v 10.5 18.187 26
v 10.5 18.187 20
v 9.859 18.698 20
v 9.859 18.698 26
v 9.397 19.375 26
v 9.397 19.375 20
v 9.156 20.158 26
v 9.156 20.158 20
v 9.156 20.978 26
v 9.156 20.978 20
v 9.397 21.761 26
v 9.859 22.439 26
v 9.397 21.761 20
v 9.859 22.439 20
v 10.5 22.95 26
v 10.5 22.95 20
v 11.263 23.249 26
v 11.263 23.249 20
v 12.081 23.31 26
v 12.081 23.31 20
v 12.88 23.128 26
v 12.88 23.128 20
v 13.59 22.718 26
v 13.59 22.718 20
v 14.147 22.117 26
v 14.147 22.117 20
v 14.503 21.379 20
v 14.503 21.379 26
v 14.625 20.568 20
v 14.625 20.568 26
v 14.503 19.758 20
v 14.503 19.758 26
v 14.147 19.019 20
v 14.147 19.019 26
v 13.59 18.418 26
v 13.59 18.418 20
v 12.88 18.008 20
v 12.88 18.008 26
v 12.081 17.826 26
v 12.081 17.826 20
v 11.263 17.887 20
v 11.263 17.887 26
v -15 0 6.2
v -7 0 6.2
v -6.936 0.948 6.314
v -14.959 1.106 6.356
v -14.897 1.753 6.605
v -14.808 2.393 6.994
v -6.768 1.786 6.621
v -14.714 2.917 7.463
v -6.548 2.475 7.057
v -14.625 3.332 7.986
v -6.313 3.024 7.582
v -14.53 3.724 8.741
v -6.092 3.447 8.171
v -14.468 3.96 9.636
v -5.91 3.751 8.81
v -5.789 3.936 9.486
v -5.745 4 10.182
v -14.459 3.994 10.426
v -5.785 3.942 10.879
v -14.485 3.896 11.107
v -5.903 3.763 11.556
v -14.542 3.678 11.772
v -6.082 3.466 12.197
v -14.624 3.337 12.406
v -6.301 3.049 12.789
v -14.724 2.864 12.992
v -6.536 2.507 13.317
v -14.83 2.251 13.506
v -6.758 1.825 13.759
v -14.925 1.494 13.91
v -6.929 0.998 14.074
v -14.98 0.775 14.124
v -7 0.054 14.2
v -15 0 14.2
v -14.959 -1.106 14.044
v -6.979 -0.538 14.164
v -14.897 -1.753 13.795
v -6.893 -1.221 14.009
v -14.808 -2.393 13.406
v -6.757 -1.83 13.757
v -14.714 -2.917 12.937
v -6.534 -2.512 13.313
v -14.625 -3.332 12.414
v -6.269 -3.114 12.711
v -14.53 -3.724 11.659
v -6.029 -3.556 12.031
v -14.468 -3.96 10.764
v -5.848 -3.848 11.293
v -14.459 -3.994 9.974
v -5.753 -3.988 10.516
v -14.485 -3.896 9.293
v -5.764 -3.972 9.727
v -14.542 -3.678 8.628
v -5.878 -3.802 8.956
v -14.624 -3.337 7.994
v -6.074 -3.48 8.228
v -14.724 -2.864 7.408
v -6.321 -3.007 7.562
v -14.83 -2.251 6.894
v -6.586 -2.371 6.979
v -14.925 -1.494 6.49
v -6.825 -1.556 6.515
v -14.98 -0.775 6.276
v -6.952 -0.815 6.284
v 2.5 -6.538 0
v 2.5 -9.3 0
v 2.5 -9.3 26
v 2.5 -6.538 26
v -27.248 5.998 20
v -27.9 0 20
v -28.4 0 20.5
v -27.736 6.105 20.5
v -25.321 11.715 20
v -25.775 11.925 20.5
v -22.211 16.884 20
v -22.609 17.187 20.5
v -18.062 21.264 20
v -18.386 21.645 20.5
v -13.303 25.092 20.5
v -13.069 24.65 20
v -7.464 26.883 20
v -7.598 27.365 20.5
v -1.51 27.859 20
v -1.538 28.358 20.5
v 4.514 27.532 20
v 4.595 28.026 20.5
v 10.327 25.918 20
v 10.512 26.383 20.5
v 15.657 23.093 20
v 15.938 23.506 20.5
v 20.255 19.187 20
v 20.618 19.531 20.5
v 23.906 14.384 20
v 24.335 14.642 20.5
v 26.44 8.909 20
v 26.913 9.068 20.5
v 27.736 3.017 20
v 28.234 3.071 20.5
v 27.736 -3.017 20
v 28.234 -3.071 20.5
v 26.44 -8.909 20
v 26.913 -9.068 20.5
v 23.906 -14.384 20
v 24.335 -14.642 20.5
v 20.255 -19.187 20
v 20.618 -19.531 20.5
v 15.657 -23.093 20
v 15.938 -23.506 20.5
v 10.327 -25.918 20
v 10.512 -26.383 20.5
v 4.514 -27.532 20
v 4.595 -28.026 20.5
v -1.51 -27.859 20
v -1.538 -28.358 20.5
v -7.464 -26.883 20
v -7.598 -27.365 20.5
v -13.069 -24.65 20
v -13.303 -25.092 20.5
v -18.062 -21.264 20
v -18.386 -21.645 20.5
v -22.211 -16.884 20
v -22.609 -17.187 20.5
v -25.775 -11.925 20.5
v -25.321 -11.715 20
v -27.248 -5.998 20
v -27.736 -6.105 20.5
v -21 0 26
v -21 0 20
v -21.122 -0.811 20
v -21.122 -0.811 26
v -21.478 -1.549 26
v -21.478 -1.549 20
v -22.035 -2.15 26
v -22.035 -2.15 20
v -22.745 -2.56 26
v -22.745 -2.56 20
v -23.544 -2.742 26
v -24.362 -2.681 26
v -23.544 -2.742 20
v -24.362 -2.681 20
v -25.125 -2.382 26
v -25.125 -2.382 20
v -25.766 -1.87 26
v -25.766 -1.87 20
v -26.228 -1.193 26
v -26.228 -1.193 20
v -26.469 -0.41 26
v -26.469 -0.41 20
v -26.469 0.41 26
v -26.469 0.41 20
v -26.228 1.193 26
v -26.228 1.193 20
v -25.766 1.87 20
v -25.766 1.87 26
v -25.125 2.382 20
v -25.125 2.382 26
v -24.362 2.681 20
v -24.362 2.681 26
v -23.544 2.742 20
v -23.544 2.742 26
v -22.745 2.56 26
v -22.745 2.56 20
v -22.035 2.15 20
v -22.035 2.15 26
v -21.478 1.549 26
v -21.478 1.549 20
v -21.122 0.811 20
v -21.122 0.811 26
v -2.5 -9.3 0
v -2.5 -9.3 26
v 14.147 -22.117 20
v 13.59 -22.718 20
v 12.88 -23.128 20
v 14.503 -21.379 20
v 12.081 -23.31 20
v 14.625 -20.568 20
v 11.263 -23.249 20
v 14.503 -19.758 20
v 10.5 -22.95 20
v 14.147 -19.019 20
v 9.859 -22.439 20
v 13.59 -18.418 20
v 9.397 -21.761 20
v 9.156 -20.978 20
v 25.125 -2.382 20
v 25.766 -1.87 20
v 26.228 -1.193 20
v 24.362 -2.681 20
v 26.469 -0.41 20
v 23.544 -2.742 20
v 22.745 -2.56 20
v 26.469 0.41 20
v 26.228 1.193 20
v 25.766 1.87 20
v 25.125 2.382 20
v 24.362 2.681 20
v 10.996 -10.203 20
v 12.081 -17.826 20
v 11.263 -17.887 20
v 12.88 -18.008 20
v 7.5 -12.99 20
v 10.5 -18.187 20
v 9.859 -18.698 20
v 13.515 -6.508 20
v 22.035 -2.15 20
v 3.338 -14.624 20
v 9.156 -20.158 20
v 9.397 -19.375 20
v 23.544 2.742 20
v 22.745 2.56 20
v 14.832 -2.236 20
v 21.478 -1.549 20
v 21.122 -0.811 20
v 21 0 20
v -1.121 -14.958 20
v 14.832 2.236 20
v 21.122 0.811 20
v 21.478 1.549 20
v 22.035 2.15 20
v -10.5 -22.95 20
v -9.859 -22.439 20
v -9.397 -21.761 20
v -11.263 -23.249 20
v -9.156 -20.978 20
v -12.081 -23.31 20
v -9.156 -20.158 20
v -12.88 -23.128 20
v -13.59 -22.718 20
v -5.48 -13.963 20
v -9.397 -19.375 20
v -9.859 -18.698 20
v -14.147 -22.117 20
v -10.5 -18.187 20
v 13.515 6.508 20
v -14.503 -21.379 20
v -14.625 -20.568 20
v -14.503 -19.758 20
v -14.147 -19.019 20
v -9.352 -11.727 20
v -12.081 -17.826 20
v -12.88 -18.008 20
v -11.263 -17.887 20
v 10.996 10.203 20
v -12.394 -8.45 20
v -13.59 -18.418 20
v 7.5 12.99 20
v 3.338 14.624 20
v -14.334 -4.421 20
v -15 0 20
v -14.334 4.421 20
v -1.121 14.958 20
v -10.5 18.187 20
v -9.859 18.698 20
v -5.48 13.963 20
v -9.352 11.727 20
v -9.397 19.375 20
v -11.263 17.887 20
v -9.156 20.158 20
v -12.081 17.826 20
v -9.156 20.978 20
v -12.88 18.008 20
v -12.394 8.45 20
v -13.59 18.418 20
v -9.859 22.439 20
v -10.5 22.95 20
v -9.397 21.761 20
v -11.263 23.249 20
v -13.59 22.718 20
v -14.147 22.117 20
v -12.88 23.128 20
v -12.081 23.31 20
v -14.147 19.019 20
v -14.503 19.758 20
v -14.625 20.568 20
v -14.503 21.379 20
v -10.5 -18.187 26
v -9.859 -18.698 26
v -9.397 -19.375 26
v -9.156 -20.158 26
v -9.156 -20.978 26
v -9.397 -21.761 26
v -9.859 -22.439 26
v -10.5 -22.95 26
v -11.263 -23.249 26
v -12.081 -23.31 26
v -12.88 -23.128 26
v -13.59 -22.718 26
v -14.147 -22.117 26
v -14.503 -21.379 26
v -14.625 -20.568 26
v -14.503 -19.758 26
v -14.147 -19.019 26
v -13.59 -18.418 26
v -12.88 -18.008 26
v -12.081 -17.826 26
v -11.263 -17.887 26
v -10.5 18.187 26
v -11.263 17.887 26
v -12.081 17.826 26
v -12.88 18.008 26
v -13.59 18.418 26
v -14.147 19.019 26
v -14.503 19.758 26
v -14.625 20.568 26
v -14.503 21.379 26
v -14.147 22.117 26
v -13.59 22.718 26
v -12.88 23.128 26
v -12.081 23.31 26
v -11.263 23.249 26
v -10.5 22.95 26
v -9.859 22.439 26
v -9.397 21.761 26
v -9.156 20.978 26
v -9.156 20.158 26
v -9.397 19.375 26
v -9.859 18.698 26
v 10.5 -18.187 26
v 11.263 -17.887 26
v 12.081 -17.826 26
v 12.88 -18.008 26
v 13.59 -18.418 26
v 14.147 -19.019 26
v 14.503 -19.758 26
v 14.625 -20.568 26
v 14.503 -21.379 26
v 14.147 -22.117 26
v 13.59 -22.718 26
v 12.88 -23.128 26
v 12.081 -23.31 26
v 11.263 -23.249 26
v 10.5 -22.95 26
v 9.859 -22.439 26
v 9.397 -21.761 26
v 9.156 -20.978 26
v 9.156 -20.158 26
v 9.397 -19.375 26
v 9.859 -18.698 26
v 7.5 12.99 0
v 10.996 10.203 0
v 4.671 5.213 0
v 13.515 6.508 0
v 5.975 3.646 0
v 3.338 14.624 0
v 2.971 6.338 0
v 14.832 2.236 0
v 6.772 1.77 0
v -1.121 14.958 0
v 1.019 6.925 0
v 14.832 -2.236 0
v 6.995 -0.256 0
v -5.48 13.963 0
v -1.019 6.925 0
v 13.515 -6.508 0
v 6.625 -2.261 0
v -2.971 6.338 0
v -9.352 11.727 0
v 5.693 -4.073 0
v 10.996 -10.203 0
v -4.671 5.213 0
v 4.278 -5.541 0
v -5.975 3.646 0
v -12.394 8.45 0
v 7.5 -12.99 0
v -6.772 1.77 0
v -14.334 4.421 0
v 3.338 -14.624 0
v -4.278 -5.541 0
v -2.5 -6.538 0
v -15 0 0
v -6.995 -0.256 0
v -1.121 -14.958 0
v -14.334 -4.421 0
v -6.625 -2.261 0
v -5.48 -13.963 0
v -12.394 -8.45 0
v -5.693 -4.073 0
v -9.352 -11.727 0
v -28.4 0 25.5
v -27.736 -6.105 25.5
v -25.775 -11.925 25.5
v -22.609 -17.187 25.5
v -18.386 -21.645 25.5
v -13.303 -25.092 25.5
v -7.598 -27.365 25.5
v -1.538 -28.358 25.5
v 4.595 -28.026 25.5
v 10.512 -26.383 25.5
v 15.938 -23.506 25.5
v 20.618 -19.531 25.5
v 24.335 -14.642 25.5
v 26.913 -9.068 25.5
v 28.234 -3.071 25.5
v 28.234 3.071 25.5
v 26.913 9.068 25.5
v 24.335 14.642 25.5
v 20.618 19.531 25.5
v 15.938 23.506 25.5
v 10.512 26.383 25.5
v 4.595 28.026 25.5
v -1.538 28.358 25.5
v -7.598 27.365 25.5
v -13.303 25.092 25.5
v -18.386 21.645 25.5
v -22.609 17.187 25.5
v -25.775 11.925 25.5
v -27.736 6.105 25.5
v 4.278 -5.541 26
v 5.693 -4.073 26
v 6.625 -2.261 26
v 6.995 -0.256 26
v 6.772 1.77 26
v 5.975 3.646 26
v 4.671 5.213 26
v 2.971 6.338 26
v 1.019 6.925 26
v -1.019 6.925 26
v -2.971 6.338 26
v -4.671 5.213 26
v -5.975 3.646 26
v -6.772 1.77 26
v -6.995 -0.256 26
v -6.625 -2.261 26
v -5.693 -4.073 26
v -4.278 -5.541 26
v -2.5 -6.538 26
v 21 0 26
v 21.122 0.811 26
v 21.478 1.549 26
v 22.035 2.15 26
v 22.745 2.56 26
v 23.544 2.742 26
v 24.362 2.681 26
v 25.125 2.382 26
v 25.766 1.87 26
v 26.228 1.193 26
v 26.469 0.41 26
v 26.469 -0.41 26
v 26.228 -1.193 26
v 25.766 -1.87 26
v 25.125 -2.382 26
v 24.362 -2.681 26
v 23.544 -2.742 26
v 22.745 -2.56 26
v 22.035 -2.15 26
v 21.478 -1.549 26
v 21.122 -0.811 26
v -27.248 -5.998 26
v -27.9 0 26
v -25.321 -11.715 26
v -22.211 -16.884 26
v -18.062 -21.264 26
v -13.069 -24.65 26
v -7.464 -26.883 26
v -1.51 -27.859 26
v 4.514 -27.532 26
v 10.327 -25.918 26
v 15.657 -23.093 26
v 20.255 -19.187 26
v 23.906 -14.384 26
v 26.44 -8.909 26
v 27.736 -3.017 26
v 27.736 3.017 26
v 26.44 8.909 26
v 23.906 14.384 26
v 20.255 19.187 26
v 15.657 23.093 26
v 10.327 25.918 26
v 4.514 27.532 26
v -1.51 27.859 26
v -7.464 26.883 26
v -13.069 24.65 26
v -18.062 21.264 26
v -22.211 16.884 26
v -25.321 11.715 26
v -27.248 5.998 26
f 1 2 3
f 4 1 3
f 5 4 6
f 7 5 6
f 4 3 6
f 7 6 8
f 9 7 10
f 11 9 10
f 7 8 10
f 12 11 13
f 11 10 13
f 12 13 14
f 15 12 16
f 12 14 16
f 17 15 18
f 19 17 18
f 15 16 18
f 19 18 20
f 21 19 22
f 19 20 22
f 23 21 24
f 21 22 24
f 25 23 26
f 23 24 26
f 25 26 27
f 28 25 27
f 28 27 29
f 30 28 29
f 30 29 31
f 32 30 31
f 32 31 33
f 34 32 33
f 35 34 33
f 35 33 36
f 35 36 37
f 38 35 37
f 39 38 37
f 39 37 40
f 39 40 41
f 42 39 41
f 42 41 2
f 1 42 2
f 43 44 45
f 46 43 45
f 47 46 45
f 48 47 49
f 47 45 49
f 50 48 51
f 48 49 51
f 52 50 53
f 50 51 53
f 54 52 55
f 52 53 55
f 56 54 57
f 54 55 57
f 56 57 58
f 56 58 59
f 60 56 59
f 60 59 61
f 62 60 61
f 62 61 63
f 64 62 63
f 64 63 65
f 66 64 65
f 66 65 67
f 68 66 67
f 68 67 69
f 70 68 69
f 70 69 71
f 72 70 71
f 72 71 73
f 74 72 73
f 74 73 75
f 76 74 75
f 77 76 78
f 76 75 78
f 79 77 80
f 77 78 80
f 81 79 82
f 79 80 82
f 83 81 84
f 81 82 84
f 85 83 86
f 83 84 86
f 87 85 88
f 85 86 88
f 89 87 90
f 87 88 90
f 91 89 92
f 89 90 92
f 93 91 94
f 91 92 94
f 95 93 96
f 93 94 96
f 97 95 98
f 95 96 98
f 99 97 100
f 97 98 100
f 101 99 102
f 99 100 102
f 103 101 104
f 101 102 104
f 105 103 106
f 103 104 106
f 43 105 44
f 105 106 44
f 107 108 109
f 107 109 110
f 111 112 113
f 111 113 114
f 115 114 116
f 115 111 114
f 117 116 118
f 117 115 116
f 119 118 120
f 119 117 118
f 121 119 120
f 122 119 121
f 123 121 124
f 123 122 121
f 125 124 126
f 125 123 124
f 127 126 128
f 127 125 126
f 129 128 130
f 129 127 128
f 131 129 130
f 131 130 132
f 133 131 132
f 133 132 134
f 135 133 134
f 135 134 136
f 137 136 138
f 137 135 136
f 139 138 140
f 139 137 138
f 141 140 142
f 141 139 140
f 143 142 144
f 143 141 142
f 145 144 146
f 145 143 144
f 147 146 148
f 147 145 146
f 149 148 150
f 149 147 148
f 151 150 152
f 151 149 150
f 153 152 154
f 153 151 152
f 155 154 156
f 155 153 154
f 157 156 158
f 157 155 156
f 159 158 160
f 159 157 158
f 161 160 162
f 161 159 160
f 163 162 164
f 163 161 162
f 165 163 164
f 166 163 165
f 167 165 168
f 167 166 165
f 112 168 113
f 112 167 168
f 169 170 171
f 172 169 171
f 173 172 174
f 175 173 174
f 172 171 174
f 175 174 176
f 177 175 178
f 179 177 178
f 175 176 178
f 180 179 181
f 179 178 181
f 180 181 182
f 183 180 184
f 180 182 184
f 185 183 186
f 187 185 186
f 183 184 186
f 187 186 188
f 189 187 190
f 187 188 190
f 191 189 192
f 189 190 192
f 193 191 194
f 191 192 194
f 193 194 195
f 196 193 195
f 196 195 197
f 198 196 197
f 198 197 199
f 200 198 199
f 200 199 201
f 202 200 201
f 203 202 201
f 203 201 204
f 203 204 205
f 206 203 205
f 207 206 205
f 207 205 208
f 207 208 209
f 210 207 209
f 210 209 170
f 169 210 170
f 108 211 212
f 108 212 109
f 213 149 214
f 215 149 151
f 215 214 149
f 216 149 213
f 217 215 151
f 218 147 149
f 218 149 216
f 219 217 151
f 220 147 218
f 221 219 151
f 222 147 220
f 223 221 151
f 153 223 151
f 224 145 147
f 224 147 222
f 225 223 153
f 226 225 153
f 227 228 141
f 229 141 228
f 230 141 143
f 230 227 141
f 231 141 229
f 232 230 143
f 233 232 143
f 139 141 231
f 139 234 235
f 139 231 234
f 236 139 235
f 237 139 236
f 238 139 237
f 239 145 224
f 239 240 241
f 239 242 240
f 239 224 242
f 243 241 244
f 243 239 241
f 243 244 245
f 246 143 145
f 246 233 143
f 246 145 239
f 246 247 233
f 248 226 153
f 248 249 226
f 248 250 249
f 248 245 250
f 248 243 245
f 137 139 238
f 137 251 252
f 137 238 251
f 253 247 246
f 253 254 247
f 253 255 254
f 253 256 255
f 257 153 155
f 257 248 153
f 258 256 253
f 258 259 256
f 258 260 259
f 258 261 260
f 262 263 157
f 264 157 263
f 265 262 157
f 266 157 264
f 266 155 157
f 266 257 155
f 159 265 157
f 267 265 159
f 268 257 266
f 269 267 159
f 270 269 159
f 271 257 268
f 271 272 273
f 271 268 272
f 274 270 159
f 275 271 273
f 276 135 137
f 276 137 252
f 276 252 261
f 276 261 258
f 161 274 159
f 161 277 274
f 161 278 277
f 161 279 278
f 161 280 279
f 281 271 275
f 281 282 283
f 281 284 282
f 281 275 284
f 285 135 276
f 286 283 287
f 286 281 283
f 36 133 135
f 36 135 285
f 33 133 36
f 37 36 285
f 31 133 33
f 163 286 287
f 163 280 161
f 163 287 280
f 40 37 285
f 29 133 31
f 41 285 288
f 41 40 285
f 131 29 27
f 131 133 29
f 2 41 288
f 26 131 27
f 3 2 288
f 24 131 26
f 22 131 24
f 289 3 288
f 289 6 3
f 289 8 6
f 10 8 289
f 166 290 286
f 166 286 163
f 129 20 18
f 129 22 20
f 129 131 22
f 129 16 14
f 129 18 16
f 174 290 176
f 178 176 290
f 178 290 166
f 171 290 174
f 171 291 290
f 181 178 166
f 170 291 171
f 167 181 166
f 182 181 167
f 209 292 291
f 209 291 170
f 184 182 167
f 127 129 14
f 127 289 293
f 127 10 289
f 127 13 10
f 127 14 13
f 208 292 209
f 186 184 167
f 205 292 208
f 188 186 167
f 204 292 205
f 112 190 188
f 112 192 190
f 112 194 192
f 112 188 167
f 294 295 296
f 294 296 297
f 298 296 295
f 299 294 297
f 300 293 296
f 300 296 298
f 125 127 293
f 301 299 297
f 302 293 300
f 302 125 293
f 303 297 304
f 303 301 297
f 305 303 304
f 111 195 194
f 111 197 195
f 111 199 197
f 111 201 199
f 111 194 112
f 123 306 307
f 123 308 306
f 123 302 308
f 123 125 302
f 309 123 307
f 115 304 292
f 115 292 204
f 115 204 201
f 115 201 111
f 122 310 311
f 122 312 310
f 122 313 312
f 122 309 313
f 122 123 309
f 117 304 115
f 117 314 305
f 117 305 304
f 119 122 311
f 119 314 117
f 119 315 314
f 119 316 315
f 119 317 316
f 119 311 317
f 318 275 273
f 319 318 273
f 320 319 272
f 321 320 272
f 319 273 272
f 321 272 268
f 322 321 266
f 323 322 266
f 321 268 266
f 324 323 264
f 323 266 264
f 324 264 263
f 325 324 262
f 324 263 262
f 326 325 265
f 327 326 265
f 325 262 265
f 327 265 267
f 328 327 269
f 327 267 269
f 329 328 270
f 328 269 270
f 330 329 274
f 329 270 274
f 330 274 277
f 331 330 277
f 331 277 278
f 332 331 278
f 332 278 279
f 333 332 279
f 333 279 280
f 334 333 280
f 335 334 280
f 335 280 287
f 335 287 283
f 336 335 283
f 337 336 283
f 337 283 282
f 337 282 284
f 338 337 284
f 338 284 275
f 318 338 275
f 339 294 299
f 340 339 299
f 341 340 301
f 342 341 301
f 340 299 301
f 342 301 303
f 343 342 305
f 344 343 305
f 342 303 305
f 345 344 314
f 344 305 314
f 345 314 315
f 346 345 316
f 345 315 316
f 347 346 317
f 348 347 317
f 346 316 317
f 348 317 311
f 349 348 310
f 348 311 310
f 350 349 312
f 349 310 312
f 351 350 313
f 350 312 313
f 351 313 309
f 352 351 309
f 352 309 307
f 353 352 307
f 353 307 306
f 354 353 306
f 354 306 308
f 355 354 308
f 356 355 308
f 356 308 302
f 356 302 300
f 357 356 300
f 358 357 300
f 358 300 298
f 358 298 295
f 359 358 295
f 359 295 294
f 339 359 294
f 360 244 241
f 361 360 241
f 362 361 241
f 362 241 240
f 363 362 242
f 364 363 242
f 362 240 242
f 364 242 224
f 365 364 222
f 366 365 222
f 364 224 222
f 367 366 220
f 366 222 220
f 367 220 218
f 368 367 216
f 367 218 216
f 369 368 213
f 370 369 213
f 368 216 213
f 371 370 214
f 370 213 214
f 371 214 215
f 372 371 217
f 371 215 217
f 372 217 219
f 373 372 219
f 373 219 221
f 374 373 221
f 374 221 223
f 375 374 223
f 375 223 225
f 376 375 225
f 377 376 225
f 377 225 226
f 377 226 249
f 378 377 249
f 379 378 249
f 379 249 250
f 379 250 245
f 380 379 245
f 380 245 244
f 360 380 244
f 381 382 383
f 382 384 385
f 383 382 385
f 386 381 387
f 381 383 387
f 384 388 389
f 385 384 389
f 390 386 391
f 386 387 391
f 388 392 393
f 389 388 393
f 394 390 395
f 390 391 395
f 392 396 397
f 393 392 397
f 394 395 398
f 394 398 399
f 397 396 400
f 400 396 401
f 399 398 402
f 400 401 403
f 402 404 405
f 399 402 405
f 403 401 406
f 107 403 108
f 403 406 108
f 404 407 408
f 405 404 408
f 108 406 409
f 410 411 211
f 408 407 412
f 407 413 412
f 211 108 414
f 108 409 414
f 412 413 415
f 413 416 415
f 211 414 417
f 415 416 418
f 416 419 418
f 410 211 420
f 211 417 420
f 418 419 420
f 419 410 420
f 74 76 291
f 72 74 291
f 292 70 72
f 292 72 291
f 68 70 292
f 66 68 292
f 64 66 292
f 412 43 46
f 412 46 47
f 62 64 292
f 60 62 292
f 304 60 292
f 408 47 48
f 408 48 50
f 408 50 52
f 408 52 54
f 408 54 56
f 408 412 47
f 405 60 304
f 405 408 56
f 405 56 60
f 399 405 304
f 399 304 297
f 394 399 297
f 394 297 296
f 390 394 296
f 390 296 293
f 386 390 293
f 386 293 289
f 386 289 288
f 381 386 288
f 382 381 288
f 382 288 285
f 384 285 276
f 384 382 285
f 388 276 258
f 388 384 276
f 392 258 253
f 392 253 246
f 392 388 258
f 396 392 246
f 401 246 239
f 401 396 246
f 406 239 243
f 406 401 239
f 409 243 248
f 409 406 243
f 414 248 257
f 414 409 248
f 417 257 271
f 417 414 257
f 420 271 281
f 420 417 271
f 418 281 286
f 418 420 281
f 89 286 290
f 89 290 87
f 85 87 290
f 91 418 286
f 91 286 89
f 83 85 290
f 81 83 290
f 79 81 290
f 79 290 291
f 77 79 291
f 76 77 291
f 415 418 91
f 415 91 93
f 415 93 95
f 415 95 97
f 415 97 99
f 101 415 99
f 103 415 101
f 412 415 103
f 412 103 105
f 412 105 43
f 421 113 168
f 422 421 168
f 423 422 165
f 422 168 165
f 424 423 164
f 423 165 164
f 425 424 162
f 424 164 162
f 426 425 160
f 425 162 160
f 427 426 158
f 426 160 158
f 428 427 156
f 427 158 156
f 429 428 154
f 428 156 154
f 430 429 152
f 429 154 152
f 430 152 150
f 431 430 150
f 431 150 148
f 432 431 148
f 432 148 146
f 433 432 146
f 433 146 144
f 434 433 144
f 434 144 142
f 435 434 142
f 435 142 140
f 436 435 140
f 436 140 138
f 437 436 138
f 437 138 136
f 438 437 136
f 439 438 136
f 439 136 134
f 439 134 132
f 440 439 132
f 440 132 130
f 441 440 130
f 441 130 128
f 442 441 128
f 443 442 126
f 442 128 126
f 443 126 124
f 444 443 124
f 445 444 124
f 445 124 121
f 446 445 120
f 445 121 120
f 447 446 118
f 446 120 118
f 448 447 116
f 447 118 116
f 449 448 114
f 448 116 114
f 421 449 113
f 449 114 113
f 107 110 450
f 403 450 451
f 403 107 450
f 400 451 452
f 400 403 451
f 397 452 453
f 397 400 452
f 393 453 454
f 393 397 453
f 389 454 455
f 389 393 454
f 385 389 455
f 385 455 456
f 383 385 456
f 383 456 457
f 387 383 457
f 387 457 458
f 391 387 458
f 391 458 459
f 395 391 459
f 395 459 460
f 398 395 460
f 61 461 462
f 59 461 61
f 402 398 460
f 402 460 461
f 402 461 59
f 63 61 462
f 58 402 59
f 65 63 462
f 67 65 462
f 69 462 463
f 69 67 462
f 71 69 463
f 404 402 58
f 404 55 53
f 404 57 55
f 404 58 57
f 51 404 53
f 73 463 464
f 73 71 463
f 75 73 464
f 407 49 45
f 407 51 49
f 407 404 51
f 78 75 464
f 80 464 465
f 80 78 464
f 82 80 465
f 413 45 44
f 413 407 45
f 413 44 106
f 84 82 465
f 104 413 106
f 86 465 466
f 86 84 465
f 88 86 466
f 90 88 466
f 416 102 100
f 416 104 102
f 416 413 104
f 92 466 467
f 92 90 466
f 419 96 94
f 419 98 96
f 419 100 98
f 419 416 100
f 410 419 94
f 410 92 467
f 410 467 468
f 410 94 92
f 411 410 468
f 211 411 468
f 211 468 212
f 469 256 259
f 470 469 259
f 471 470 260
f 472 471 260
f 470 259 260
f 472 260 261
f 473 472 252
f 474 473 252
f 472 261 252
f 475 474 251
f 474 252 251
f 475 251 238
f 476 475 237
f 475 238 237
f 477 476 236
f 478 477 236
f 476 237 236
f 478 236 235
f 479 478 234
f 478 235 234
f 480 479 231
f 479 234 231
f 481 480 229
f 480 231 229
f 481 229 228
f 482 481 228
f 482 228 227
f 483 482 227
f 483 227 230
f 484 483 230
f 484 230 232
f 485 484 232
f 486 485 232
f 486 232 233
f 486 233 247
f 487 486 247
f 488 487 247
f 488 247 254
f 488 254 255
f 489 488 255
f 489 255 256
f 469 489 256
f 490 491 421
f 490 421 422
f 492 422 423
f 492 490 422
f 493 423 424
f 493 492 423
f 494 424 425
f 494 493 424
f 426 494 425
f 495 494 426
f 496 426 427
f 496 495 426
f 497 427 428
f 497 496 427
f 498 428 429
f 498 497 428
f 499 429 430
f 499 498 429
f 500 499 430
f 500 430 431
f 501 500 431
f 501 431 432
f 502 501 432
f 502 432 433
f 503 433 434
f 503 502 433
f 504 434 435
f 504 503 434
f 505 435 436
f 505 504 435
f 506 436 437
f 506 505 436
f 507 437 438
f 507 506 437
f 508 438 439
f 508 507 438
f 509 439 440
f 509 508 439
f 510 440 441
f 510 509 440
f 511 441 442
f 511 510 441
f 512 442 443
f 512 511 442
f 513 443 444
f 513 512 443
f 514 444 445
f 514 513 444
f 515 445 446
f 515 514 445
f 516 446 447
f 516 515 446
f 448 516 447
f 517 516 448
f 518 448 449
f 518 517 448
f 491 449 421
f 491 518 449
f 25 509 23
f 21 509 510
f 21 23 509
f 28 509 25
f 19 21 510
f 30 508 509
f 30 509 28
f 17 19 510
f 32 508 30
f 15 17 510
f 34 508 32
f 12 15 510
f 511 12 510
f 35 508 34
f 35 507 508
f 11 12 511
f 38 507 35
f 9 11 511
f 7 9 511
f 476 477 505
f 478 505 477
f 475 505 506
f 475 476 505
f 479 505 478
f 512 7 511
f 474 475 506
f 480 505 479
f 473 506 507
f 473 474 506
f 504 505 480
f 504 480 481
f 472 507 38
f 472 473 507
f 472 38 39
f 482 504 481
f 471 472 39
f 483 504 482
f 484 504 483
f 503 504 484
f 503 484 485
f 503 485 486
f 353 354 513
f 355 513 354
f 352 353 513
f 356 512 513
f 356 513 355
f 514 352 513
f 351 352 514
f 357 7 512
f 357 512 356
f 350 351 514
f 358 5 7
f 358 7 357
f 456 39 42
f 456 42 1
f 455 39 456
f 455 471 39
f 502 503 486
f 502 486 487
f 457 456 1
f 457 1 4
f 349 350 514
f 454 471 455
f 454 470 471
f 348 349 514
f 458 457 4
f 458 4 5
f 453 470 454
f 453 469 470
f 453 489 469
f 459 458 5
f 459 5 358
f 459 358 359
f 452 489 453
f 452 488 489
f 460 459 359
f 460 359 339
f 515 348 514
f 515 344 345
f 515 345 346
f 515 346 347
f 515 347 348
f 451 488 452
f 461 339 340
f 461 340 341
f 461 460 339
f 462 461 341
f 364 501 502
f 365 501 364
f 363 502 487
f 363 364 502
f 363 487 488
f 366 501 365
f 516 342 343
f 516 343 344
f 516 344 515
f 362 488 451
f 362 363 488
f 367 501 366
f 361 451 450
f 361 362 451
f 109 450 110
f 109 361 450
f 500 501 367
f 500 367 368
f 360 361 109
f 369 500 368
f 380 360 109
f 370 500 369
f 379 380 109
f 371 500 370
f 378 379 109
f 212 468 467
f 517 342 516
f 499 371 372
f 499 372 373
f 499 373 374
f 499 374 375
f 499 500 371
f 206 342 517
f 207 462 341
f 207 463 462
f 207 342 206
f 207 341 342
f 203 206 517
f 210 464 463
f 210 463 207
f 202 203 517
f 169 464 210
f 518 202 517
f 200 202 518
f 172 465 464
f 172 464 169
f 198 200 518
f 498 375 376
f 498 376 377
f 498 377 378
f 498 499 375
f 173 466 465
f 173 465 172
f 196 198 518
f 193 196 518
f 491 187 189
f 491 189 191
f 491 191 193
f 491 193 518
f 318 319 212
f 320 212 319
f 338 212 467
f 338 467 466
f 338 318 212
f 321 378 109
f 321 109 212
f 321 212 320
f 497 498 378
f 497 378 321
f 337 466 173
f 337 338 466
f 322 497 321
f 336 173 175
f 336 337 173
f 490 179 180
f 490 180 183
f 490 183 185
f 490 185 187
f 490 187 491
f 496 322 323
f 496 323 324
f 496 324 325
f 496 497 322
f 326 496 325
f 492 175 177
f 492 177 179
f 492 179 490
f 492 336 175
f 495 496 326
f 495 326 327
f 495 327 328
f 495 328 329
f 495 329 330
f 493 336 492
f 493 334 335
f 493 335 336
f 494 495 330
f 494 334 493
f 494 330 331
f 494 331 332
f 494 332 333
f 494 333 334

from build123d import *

# Parameters (mm, degrees)
SKETCH1_R            = 28.4
BOSS_EXTRUDE1_DEPTH  = 26
SKETCH2_OUTSIDE_W    = 75.686
SKETCH2_OUTSIDE_H    = 75.686
SKETCH2_OUTSIDE_R    = 15
CUT_EXTRUDE1_DEPTH   = 20
CUT_EXTRUDE2_DEPTH   = 48.844748928
CHAMFER1_SIZE        = 0.5
M5_CLEARANCE_HOLE1_D = 5.5
CIRPATTERN1_COUNT    = 6
SKETCH9_R            = 4
CUT_EXTRUDE3_DEPTH   = 48.844748928


with BuildPart() as part:
    # Sketch1 → Boss-Extrude1 (new body)
    with BuildSketch(Plane.XY):
        with Locations(Location((0, 0, 0), (0, 0, 180))):
            Circle(SKETCH1_R)
    extrude(amount=BOSS_EXTRUDE1_DEPTH)

    # Sketch2 outside → Cut-Extrude1 (cut)
    with BuildSketch(Plane(origin=(0, 0, 0), x_dir=(-1, 0, 0), z_dir=(0, 0, -1))):
        Rectangle(SKETCH2_OUTSIDE_W, SKETCH2_OUTSIDE_H)
        Circle(SKETCH2_OUTSIDE_R, mode=Mode.SUBTRACT)
    extrude(amount=-CUT_EXTRUDE1_DEPTH, mode=Mode.SUBTRACT)

    # Sketch3 → Cut-Extrude2 (cut, through all)
    with BuildSketch(Plane(origin=(0, 0, 0), x_dir=(-1, 0, 0), z_dir=(0, 0, -1))):
        with BuildLine():
            Line((2.5, -6.538348415), (2.5, -9.3))
            Line((2.5, -9.3), (-2.5, -9.3))
            Line((-2.5, -9.3), (-2.5, -6.538348415))
            ThreePointArc((-2.5, -6.538348415), (0, 7), (2.5, -6.538348415))
        make_face()
    extrude(amount=-CUT_EXTRUDE2_DEPTH, mode=Mode.SUBTRACT)

    # Chamfer1
    chamfer1_edges = [part.edges().sort_by_distance(p)[0] for p in [
        (28.4, 0, 26),
        (28.4, 0, 20),
    ]]
    chamfer(chamfer1_edges, length=CHAMFER1_SIZE)

    # M5 Clearance Hole1 (through all)
    with Locations(Plane.XY.offset(26)):
        with Locations((23.75, 0)):
            m5_clearance_hole1 = Hole(M5_CLEARANCE_HOLE1_D / 2)

    # CirPattern1: M5 Clearance Hole1 ×6 about axis
    cirpattern1_axis = Axis((0, 0, 0), (0, 0, 1))
    for i in range(1, CIRPATTERN1_COUNT):
        add(m5_clearance_hole1.rotate(cirpattern1_axis, i * 360 / CIRPATTERN1_COUNT), mode=Mode.SUBTRACT)

    # Sketch9 → Cut-Extrude3 (cut, through all)
    with BuildSketch(Plane(origin=(0, 0, 0), x_dir=(0, 0, -1), z_dir=(1, 0, 0))):
        with Locations((-10.2, 0)):
            Circle(SKETCH9_R)
    extrude(amount=-CUT_EXTRUDE3_DEPTH, mode=Mode.SUBTRACT)


solid = part.part
